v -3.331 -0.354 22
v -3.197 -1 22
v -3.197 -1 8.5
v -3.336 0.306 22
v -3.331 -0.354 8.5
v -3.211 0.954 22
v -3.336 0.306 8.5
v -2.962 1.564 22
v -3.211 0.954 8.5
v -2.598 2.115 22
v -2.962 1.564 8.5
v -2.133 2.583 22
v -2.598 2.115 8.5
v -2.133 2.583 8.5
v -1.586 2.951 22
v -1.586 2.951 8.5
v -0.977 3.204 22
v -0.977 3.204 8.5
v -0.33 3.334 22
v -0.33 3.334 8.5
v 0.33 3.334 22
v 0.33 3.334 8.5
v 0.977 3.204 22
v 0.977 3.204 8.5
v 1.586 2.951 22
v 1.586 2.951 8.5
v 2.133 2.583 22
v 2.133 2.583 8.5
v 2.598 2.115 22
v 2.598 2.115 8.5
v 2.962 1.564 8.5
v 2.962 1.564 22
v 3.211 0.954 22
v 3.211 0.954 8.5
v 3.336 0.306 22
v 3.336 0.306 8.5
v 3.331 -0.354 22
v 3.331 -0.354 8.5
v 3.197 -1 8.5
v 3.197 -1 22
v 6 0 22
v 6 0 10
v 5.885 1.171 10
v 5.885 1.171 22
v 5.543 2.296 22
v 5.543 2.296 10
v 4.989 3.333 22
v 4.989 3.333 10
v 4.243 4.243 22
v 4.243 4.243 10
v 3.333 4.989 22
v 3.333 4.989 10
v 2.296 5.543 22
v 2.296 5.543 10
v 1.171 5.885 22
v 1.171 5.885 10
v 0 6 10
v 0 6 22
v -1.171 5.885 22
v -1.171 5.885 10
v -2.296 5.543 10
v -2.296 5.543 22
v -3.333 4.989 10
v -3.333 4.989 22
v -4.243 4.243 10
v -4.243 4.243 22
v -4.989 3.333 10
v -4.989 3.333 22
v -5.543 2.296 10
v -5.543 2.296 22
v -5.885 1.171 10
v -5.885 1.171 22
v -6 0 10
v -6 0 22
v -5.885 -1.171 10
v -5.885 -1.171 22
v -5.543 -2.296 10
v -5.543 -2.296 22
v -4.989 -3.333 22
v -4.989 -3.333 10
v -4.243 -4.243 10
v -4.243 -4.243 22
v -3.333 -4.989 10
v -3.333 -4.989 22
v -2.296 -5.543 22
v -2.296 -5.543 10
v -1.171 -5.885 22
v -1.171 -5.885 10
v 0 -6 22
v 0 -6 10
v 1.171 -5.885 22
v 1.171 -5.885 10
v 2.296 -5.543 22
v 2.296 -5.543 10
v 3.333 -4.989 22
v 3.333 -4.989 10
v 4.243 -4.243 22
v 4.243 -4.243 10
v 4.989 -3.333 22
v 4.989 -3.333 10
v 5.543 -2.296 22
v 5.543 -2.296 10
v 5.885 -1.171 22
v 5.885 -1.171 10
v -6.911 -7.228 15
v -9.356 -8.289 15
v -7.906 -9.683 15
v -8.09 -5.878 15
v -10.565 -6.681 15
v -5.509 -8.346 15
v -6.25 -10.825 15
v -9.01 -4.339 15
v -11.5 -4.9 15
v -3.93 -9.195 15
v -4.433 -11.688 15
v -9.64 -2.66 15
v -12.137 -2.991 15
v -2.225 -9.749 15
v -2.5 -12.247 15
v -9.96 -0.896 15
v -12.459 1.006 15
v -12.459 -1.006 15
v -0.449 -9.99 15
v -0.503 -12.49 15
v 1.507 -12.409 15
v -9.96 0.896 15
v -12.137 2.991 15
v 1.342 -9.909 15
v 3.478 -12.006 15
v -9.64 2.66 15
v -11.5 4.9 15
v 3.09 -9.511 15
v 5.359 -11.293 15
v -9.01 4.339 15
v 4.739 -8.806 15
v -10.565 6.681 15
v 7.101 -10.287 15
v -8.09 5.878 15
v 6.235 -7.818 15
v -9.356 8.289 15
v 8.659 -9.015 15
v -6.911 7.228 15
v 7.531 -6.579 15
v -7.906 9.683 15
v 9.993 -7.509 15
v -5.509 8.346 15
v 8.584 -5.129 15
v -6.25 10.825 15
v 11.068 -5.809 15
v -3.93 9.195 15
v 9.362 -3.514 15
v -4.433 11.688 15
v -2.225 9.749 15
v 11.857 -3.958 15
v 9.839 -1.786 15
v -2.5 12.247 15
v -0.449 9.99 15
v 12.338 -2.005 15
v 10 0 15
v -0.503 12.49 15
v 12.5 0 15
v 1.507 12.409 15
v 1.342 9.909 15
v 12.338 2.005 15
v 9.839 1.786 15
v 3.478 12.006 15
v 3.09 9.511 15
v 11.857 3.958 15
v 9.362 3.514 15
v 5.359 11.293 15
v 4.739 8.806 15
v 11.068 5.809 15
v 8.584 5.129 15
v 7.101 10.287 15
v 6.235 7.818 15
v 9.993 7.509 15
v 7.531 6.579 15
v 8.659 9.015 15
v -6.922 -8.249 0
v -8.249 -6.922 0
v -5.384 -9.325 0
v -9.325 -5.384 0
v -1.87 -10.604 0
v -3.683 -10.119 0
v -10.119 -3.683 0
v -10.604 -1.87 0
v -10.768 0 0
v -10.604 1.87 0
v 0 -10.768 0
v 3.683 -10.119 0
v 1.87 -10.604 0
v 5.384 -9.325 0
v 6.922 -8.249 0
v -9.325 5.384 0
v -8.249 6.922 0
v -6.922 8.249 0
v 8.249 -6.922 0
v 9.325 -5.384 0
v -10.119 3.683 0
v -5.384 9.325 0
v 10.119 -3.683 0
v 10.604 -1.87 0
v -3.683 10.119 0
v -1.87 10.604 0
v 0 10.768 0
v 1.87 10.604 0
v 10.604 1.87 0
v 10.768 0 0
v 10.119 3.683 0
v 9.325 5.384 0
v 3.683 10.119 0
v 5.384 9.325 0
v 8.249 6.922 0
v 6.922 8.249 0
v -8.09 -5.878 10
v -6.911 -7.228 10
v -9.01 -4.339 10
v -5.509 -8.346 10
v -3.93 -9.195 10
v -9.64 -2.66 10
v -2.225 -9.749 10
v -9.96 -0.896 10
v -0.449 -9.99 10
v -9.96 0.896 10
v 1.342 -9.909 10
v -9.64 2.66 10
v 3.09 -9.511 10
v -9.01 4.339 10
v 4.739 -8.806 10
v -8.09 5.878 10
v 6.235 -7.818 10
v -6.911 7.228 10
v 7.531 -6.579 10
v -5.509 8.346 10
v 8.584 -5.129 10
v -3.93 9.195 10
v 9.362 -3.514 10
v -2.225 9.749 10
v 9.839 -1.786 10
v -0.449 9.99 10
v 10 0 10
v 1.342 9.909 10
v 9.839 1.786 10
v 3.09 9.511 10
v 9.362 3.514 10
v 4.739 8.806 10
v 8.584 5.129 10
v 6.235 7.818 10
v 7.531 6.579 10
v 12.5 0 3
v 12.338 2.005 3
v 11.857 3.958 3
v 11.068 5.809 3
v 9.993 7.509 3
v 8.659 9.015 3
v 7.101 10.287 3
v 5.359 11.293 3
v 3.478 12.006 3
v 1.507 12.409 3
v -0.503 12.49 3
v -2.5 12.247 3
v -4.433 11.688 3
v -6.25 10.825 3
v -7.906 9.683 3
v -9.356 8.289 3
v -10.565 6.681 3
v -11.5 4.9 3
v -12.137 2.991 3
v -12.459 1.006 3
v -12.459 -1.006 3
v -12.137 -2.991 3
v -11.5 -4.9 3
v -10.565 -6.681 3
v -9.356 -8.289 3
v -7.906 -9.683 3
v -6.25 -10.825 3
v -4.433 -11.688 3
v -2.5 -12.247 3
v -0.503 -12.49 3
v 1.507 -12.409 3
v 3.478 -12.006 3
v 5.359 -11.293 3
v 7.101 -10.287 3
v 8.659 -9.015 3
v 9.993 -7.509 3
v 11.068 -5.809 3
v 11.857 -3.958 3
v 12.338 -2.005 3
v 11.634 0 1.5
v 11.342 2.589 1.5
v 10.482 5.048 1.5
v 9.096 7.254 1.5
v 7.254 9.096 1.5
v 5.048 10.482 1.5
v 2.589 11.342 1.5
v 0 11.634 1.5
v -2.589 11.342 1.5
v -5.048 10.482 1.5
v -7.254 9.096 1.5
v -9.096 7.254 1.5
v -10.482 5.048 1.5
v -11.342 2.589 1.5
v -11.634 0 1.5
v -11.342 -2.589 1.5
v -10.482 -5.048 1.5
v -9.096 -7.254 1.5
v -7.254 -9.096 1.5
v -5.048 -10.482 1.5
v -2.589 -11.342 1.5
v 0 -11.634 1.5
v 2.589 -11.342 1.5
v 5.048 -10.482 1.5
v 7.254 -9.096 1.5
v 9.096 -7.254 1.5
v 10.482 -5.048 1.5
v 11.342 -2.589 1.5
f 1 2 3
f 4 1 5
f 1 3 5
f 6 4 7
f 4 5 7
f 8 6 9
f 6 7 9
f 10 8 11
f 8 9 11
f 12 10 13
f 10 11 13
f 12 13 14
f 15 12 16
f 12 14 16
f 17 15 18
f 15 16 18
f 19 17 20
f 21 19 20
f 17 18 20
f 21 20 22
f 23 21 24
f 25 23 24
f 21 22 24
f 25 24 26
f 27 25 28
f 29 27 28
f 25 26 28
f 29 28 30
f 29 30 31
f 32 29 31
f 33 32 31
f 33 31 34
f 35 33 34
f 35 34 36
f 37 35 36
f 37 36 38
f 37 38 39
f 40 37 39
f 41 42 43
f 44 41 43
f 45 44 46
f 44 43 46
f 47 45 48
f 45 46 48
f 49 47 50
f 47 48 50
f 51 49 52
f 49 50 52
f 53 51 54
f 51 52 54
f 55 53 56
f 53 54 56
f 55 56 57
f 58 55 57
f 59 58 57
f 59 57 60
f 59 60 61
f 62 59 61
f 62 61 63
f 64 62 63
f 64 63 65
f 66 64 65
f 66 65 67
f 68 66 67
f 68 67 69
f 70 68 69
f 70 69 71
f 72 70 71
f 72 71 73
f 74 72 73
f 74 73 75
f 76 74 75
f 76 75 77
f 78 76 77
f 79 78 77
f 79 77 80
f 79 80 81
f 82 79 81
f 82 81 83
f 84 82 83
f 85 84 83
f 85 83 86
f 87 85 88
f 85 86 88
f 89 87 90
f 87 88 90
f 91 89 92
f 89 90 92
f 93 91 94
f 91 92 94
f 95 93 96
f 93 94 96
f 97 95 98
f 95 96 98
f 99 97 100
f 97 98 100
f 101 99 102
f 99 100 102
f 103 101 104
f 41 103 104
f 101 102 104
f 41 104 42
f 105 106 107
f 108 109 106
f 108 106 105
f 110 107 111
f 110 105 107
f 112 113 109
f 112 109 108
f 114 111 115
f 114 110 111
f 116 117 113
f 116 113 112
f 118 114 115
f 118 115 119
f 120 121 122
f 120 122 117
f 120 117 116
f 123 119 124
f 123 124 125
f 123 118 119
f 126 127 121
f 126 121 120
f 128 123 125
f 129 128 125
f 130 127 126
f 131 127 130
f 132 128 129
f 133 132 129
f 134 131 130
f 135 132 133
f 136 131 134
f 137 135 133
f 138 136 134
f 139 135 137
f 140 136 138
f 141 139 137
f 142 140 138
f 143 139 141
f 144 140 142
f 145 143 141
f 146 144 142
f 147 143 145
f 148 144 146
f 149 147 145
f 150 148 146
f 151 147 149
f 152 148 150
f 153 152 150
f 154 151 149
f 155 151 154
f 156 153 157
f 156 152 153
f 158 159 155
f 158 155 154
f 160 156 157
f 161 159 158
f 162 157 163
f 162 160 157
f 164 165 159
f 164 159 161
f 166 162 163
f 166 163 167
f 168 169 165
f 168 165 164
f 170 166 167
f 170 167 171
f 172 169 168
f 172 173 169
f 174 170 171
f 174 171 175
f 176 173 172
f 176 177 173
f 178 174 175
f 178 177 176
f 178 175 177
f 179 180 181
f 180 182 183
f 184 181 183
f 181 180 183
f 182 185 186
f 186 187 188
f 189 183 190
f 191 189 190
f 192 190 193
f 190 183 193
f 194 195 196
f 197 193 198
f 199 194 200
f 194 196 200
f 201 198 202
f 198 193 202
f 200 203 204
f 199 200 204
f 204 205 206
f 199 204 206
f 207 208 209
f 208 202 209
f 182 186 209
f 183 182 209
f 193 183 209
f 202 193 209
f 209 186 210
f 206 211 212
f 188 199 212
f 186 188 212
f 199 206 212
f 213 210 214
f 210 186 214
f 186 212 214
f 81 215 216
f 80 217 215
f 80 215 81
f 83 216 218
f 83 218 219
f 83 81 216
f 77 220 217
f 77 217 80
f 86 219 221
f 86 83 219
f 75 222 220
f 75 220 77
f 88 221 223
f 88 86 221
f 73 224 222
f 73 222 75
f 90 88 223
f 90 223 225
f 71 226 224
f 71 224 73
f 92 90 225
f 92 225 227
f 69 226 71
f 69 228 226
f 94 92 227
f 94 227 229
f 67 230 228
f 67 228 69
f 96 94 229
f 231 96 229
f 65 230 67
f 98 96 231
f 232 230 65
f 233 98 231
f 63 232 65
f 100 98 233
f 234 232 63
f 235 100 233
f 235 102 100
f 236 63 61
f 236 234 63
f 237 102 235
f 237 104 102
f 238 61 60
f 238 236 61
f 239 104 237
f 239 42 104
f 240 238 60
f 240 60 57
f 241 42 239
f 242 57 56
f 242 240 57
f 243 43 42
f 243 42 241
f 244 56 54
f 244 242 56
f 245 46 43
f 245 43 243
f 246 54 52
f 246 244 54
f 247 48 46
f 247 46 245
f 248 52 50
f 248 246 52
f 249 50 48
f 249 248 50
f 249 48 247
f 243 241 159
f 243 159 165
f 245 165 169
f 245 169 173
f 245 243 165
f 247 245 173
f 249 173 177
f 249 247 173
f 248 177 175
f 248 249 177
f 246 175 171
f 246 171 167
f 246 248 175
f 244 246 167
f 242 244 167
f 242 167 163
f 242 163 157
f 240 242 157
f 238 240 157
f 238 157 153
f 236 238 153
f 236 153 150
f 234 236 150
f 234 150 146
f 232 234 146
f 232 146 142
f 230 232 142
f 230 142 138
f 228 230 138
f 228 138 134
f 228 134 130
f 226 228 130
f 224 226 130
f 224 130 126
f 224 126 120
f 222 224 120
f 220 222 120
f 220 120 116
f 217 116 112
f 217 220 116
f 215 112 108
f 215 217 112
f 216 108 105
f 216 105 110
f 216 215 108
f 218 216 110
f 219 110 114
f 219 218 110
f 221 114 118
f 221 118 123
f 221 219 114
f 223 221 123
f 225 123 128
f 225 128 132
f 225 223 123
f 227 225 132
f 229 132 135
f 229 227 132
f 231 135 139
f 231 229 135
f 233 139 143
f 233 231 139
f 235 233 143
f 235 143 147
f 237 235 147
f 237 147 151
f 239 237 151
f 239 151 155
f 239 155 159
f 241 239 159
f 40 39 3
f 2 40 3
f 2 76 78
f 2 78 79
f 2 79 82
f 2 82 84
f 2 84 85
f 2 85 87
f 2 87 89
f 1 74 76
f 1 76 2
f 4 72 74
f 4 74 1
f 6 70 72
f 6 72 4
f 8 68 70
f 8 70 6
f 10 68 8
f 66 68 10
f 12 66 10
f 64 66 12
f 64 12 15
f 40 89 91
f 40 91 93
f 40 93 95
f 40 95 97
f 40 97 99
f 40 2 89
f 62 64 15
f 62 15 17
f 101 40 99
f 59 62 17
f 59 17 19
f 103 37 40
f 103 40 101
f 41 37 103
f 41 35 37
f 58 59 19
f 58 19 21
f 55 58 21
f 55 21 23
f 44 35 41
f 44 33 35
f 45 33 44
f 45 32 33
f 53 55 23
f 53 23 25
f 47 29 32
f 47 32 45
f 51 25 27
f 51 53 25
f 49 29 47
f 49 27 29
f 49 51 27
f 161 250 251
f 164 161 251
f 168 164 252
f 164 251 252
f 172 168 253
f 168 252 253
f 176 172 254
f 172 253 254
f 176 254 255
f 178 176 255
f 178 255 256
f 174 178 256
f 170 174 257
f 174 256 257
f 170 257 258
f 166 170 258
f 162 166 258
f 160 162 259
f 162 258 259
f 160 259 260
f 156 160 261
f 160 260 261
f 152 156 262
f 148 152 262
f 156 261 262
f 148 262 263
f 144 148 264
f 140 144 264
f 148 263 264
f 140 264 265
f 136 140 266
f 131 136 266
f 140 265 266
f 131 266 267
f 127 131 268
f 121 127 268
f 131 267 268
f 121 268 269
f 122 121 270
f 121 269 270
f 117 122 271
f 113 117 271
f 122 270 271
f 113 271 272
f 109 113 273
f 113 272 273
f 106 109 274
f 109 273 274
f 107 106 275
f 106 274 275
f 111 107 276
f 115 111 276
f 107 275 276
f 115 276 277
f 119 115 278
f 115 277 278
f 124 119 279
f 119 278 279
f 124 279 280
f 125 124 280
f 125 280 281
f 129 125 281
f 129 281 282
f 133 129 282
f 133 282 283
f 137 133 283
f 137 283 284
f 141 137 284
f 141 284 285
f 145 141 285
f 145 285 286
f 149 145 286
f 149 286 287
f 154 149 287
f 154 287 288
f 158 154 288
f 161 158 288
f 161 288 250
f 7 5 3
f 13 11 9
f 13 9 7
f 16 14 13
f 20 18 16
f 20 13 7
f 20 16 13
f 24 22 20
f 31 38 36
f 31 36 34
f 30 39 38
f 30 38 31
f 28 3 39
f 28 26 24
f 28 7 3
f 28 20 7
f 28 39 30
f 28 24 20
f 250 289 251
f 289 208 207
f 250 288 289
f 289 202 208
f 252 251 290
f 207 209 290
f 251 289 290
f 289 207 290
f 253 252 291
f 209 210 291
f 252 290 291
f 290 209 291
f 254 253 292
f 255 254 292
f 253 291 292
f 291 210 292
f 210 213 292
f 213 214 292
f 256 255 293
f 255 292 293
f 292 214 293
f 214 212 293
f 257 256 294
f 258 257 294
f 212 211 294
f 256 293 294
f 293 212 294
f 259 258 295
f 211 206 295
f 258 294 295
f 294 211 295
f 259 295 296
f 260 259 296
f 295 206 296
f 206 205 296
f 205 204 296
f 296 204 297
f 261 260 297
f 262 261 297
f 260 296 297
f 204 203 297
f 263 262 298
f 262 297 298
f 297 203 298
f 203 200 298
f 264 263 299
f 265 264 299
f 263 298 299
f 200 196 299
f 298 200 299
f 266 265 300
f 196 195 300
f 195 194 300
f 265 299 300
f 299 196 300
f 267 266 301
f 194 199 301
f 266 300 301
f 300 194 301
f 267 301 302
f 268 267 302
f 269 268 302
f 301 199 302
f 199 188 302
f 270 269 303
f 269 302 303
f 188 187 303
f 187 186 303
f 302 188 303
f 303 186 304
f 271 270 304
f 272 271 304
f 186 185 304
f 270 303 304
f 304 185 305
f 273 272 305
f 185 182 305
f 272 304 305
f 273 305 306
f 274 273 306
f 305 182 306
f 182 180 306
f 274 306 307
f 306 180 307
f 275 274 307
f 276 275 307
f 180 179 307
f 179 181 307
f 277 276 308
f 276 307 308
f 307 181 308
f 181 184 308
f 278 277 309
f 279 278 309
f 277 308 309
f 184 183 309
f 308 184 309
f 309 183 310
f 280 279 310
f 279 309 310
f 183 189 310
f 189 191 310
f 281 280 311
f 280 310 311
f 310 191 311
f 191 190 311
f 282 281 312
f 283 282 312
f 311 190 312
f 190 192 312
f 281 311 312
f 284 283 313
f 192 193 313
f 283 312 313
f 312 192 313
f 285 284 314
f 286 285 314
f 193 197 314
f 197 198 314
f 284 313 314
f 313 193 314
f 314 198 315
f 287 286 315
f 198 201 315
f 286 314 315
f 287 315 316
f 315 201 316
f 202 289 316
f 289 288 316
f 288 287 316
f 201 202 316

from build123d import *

# Parameters (mm, degrees)
F0_R     = 12.5
F0_R_2   = 10
F1_DEPTH = 15
F0_R_3   = 6
F2_DEPTH = 10
F3_DEPTH = 22
F4_DEPTH = 8.5
F5_SIZE2 = 1.7320508076
F5_SIZE  = 3


with BuildPart() as f1:
    # F0 (on Top) → F1 (new body)
    with BuildSketch(Plane.XY):
        Circle(F0_R)
        Circle(F0_R_2, mode=Mode.SUBTRACT)
    extrude(amount=F1_DEPTH)

    # F0 (on Top) → F2 (join)
    with BuildSketch(Plane.XY):
        Circle(F0_R_2)
        Circle(F0_R_3, mode=Mode.SUBTRACT)
    extrude(amount=F2_DEPTH)

    # F0 (on Top) → F3 (join)
    with BuildSketch(Plane.XY):
        Circle(F0_R_3)
        with BuildLine():
            ThreePointArc((-3.1972644557, -1), (0, 3.35), (3.1972644557, -1))
            Line((3.1972644557, -1), (-3.1972644557, -1))
        make_face(mode=Mode.SUBTRACT)
    extrude(amount=F3_DEPTH)

    # F0 (on Top) → F4 (join)
    with BuildSketch(Plane.XY):
        with BuildLine():
            Line((-3.1972644557, -1), (3.1972644557, -1))
            ThreePointArc((3.1972644557, -1), (0, 3.35), (-3.1972644557, -1))
        make_face()
    extrude(amount=F4_DEPTH)

    # F5
    f5_edges = [f1.edges().sort_by_distance(p)[0] for p in [
        (-12.5, 0, 0),
    ]]
    f5_side = f1.faces().sort_by_distance((-12.5, 0, 7.5))[0]
    chamfer(f5_edges, length=F5_SIZE, length2=F5_SIZE2, reference=f5_side)


solid = f1.part
